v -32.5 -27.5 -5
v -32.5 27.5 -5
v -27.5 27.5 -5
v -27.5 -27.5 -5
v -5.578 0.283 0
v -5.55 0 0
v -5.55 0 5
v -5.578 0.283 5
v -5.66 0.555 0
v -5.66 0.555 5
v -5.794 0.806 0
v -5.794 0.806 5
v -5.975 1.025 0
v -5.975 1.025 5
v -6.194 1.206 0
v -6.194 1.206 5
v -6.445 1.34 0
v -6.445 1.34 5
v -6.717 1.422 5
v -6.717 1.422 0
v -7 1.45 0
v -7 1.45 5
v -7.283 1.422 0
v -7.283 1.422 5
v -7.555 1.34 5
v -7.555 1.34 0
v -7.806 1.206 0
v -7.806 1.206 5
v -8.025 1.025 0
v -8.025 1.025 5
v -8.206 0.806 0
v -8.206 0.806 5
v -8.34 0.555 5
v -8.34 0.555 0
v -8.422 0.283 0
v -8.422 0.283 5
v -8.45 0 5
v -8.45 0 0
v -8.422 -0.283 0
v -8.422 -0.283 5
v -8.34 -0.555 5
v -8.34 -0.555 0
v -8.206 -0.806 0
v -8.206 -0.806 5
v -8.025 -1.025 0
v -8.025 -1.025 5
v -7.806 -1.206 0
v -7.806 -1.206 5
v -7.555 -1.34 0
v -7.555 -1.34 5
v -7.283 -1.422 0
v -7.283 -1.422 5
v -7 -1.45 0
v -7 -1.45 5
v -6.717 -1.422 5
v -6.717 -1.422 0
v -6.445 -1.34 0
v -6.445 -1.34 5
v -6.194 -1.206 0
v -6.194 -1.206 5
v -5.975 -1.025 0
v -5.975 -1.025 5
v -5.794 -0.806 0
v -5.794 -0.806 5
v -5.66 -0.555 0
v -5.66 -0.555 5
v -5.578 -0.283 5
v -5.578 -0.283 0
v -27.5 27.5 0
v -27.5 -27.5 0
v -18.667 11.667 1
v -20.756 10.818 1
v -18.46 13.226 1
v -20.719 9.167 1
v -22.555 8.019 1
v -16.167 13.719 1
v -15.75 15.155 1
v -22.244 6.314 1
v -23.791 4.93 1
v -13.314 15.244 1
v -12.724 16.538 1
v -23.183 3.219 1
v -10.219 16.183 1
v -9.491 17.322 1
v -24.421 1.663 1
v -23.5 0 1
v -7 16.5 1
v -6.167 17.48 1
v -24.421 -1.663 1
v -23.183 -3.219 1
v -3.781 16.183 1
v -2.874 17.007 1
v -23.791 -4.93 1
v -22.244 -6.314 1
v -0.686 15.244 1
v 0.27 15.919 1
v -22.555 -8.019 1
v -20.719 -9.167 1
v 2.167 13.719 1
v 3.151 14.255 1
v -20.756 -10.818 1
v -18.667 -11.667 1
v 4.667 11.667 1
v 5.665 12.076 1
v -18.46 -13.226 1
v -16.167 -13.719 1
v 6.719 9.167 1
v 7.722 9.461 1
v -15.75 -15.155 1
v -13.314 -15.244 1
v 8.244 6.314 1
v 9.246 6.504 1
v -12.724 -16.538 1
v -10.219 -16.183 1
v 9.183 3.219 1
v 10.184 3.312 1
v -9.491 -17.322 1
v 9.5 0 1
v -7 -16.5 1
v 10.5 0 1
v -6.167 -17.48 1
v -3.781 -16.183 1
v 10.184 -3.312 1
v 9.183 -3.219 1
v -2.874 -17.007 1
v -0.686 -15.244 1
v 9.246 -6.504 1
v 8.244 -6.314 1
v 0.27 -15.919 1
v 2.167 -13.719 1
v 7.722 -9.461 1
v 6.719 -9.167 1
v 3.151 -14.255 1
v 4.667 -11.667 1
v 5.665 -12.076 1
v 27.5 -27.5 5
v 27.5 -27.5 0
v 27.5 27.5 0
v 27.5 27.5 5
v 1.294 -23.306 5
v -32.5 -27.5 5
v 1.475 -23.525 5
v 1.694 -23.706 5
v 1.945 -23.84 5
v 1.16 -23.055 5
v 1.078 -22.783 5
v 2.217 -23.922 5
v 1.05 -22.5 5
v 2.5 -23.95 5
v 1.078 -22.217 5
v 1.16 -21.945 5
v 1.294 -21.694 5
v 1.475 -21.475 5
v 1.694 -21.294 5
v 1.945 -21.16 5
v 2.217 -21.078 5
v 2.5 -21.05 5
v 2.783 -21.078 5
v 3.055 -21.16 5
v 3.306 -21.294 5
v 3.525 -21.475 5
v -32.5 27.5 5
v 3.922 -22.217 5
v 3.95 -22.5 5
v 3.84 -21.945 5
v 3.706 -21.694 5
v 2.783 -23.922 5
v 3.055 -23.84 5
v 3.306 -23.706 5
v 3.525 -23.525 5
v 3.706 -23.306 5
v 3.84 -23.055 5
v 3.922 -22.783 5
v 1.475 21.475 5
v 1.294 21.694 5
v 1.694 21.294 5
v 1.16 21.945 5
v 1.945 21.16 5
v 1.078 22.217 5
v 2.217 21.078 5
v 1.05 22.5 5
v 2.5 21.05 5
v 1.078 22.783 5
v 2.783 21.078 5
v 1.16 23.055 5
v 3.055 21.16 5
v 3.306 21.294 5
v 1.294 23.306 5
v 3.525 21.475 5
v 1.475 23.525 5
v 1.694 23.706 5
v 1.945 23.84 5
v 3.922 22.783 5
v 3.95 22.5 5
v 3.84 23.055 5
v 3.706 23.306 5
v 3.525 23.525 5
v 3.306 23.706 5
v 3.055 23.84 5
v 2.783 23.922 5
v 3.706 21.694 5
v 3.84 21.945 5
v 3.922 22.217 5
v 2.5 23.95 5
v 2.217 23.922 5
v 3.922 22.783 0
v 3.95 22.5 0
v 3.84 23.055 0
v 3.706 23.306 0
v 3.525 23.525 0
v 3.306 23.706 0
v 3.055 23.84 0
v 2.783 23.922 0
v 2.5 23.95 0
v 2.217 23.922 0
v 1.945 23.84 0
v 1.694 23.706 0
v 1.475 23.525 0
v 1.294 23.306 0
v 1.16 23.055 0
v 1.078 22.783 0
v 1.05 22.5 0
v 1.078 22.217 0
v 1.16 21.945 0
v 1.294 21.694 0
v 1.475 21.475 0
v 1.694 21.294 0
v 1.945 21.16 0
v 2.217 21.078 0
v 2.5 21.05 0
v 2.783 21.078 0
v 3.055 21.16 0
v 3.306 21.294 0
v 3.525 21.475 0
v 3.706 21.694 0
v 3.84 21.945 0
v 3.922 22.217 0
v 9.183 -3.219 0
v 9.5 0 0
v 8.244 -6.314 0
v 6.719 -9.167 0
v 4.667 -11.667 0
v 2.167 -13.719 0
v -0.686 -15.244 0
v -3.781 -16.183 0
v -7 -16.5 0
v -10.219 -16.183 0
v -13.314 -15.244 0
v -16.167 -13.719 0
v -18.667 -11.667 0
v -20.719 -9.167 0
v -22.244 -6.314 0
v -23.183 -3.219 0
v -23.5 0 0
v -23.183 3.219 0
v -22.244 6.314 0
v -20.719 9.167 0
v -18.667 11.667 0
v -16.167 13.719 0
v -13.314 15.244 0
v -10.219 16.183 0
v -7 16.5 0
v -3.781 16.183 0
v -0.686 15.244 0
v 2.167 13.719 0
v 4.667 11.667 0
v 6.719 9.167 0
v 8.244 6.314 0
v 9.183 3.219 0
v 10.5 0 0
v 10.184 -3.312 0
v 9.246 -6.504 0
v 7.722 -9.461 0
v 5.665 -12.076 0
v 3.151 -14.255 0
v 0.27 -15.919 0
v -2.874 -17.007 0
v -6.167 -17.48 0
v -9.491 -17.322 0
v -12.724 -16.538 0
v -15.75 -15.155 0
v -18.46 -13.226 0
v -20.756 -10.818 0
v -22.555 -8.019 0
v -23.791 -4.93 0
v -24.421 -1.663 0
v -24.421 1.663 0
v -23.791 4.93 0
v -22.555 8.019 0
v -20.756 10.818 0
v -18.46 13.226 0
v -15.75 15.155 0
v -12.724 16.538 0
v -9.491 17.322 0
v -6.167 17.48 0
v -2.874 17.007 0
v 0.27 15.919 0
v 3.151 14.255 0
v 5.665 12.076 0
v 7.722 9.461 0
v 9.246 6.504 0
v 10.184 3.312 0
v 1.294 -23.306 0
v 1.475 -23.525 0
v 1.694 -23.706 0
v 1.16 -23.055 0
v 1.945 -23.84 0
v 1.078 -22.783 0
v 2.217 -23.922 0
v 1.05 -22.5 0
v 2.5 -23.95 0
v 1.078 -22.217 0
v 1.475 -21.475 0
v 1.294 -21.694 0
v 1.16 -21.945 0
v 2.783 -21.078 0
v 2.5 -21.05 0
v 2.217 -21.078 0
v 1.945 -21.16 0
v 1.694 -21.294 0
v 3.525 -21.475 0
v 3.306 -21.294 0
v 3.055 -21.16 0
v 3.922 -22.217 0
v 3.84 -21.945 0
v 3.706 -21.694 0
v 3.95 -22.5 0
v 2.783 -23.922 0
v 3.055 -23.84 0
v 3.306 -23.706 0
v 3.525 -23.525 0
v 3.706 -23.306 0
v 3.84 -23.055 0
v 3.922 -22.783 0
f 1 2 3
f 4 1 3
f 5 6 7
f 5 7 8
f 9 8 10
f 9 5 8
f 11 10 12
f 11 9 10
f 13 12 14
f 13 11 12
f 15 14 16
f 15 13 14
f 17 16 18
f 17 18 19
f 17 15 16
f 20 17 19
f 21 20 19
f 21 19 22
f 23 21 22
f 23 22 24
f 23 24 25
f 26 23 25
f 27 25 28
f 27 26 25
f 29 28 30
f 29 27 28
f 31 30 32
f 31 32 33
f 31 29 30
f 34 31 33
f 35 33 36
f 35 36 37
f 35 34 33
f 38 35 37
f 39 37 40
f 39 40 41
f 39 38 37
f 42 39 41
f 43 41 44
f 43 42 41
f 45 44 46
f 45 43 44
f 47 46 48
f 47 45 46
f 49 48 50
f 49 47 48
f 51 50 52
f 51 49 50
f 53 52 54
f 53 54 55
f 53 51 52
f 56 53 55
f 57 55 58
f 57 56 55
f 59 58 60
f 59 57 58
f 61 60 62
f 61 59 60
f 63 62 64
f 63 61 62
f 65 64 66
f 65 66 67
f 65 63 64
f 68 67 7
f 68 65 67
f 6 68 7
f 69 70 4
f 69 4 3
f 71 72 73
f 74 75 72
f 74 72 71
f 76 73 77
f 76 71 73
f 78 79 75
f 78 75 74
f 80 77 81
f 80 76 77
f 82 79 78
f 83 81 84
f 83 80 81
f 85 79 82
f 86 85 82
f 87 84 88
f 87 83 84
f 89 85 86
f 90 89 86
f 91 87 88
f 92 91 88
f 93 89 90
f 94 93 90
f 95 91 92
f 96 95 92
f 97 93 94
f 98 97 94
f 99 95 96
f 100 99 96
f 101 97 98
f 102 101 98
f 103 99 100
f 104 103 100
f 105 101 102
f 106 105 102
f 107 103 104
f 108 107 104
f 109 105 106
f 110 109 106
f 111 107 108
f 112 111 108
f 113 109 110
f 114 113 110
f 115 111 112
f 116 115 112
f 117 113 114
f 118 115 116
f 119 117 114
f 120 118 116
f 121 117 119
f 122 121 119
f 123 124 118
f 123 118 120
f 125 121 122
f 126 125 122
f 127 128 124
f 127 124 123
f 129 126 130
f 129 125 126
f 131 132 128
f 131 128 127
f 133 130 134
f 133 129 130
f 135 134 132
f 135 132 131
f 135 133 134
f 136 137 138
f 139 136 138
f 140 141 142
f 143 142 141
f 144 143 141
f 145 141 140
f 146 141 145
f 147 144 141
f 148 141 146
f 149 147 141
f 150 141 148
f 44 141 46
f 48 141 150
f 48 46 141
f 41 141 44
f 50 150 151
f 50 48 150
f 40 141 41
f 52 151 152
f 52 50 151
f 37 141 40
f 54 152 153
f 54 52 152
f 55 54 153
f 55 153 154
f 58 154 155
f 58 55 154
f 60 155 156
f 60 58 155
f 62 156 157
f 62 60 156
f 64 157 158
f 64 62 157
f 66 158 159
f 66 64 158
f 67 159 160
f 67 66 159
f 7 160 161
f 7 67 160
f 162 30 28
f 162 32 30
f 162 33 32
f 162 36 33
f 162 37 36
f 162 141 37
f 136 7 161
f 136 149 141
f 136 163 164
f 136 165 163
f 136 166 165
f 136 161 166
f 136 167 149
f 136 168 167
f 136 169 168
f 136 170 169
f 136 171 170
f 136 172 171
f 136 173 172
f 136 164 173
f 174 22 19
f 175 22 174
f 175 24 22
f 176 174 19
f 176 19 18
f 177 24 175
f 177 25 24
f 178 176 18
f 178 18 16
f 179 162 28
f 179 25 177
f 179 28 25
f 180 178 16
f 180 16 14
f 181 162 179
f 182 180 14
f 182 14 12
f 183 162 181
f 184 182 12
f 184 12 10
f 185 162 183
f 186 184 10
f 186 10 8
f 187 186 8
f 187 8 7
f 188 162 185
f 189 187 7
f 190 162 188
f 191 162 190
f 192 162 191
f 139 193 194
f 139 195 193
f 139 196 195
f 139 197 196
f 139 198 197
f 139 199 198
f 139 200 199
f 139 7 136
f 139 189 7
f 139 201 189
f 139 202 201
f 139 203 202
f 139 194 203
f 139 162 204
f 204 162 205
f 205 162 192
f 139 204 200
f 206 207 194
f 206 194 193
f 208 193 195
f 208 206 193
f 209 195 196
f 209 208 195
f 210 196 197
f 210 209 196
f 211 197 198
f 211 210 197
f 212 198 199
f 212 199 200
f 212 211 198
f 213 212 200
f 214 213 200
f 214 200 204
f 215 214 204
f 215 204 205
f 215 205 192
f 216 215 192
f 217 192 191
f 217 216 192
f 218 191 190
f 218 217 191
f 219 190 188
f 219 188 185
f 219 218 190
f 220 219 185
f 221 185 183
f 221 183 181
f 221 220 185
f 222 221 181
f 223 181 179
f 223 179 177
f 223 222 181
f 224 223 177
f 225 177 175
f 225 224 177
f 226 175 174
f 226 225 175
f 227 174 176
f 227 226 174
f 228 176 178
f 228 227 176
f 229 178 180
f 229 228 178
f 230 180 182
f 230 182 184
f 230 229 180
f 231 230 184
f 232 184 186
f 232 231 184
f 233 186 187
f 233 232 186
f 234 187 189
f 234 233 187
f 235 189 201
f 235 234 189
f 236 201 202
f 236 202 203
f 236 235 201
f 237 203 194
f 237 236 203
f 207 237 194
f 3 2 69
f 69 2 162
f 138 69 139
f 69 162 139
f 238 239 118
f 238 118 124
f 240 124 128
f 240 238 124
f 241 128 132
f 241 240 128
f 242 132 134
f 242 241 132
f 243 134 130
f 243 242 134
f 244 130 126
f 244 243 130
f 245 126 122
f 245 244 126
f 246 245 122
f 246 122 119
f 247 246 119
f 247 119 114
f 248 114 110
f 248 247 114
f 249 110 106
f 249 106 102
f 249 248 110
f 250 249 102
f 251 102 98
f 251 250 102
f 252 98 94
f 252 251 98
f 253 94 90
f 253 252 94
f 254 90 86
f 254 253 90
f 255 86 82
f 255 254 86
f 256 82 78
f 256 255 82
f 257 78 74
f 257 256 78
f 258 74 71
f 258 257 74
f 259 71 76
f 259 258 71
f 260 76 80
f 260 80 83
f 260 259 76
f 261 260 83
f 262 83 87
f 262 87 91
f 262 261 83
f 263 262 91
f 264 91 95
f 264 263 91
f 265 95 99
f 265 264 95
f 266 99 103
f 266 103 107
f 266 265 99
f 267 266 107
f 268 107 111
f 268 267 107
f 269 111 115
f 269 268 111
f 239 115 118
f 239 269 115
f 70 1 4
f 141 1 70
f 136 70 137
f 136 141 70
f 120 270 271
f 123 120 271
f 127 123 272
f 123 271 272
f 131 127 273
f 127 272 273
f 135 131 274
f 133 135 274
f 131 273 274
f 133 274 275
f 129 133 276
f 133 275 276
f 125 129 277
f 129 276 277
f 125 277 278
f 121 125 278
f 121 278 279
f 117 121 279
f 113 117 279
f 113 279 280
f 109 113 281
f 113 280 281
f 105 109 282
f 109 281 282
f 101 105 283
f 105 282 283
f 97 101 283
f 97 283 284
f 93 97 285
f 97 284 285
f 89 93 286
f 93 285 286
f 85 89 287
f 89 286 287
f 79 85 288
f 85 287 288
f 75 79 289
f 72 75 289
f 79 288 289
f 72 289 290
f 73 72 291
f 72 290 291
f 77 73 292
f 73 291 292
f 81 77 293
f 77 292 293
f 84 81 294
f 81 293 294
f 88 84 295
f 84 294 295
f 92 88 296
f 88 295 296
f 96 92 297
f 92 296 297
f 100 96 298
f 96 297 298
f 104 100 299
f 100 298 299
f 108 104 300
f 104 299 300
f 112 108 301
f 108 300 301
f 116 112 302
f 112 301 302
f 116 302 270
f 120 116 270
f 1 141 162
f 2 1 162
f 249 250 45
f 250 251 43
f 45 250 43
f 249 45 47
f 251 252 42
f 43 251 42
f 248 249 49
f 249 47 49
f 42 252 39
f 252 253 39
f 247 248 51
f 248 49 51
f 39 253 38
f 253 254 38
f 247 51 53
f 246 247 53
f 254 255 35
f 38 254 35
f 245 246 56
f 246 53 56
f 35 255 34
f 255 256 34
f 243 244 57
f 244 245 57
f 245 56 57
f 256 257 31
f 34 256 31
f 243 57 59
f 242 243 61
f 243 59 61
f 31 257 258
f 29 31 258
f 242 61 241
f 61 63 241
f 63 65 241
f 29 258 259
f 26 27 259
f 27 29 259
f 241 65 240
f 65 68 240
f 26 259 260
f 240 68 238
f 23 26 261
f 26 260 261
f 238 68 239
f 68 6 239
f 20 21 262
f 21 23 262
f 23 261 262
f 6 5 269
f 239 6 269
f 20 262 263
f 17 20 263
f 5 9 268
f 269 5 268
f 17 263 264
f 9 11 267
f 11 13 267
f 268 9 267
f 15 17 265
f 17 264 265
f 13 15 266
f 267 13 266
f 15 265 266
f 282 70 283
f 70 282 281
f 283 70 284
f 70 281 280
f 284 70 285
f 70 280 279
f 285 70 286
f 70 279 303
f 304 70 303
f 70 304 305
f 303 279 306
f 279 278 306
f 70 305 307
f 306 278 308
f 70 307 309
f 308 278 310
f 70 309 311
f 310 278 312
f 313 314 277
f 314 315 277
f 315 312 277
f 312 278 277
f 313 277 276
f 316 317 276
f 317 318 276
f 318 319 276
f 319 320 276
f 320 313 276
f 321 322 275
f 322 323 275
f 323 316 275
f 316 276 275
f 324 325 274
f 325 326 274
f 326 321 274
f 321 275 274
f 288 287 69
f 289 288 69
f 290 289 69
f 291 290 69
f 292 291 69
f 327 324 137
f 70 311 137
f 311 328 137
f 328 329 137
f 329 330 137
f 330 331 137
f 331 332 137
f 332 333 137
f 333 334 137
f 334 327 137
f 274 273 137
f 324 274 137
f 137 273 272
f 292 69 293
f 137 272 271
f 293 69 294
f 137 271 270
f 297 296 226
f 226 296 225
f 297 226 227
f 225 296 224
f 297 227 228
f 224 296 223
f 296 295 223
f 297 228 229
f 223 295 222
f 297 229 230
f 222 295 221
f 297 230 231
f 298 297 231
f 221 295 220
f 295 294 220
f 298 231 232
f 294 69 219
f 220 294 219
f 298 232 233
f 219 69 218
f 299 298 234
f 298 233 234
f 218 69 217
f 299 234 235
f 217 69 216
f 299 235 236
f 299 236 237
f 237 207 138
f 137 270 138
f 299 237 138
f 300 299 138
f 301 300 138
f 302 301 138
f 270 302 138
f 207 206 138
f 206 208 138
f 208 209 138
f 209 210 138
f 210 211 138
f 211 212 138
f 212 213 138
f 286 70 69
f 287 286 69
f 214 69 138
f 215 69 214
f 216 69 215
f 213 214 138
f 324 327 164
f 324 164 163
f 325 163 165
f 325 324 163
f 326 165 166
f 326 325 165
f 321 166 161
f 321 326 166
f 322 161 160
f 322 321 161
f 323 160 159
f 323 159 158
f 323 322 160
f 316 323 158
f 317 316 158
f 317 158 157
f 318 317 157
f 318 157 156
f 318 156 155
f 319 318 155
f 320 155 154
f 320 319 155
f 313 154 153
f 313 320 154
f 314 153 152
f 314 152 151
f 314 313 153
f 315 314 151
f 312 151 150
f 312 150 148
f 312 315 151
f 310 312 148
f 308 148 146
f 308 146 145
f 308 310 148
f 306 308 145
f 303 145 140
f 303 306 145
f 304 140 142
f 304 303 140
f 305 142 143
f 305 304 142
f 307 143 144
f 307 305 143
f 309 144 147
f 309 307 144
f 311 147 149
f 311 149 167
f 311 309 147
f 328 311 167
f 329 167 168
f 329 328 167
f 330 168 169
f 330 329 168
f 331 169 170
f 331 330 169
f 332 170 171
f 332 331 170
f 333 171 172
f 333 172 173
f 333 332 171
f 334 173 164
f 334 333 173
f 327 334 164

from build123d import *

# Parameters (mm, degrees)
F0_W     = 55
F0_H     = 55
F0_R     = 1.45
F0_R_2   = 17.5
F1_DEPTH = 5
F2_R     = 17.5
F2_R_2   = 16.5
F3_DEPTH = 1
F4_W     = 5
F4_H     = 55
F5_DEPTH = 10


with BuildPart() as f1:
    # F0 (on Top) → F1 (new body)
    with BuildSketch(Plane.XY):
        Rectangle(F0_W, F0_H)
        with Locations((2.5, -22.5)):
            Circle(F0_R, mode=Mode.SUBTRACT)
        with Locations((-7, 0)):
            Circle(F0_R_2, mode=Mode.SUBTRACT)
        with Locations((2.5, 22.5)):
            Circle(F0_R, mode=Mode.SUBTRACT)
        with Locations((-7, 0)):
            Circle(F0_R_2)
        with Locations((-7, 0)):
            Circle(F0_R, mode=Mode.SUBTRACT)
    extrude(amount=F1_DEPTH)

    # F2 (on face) → F3 (cut)
    with BuildSketch(Plane(origin=(0, 0, 0), x_dir=(1, 0, 0), z_dir=(0, 0, -1))):
        with Locations((-7, 0)):
            Circle(F2_R)
        with Locations((-7, 0)):
            Circle(F2_R_2, mode=Mode.SUBTRACT)
    extrude(amount=-F3_DEPTH, mode=Mode.SUBTRACT)

    # F4 (on face) → F5 (join)
    with BuildSketch(Plane.XY.offset(5)):
        with Locations((-30, 0)):
            Rectangle(F4_W, F4_H)
    extrude(amount=-F5_DEPTH)


solid = f1.part
